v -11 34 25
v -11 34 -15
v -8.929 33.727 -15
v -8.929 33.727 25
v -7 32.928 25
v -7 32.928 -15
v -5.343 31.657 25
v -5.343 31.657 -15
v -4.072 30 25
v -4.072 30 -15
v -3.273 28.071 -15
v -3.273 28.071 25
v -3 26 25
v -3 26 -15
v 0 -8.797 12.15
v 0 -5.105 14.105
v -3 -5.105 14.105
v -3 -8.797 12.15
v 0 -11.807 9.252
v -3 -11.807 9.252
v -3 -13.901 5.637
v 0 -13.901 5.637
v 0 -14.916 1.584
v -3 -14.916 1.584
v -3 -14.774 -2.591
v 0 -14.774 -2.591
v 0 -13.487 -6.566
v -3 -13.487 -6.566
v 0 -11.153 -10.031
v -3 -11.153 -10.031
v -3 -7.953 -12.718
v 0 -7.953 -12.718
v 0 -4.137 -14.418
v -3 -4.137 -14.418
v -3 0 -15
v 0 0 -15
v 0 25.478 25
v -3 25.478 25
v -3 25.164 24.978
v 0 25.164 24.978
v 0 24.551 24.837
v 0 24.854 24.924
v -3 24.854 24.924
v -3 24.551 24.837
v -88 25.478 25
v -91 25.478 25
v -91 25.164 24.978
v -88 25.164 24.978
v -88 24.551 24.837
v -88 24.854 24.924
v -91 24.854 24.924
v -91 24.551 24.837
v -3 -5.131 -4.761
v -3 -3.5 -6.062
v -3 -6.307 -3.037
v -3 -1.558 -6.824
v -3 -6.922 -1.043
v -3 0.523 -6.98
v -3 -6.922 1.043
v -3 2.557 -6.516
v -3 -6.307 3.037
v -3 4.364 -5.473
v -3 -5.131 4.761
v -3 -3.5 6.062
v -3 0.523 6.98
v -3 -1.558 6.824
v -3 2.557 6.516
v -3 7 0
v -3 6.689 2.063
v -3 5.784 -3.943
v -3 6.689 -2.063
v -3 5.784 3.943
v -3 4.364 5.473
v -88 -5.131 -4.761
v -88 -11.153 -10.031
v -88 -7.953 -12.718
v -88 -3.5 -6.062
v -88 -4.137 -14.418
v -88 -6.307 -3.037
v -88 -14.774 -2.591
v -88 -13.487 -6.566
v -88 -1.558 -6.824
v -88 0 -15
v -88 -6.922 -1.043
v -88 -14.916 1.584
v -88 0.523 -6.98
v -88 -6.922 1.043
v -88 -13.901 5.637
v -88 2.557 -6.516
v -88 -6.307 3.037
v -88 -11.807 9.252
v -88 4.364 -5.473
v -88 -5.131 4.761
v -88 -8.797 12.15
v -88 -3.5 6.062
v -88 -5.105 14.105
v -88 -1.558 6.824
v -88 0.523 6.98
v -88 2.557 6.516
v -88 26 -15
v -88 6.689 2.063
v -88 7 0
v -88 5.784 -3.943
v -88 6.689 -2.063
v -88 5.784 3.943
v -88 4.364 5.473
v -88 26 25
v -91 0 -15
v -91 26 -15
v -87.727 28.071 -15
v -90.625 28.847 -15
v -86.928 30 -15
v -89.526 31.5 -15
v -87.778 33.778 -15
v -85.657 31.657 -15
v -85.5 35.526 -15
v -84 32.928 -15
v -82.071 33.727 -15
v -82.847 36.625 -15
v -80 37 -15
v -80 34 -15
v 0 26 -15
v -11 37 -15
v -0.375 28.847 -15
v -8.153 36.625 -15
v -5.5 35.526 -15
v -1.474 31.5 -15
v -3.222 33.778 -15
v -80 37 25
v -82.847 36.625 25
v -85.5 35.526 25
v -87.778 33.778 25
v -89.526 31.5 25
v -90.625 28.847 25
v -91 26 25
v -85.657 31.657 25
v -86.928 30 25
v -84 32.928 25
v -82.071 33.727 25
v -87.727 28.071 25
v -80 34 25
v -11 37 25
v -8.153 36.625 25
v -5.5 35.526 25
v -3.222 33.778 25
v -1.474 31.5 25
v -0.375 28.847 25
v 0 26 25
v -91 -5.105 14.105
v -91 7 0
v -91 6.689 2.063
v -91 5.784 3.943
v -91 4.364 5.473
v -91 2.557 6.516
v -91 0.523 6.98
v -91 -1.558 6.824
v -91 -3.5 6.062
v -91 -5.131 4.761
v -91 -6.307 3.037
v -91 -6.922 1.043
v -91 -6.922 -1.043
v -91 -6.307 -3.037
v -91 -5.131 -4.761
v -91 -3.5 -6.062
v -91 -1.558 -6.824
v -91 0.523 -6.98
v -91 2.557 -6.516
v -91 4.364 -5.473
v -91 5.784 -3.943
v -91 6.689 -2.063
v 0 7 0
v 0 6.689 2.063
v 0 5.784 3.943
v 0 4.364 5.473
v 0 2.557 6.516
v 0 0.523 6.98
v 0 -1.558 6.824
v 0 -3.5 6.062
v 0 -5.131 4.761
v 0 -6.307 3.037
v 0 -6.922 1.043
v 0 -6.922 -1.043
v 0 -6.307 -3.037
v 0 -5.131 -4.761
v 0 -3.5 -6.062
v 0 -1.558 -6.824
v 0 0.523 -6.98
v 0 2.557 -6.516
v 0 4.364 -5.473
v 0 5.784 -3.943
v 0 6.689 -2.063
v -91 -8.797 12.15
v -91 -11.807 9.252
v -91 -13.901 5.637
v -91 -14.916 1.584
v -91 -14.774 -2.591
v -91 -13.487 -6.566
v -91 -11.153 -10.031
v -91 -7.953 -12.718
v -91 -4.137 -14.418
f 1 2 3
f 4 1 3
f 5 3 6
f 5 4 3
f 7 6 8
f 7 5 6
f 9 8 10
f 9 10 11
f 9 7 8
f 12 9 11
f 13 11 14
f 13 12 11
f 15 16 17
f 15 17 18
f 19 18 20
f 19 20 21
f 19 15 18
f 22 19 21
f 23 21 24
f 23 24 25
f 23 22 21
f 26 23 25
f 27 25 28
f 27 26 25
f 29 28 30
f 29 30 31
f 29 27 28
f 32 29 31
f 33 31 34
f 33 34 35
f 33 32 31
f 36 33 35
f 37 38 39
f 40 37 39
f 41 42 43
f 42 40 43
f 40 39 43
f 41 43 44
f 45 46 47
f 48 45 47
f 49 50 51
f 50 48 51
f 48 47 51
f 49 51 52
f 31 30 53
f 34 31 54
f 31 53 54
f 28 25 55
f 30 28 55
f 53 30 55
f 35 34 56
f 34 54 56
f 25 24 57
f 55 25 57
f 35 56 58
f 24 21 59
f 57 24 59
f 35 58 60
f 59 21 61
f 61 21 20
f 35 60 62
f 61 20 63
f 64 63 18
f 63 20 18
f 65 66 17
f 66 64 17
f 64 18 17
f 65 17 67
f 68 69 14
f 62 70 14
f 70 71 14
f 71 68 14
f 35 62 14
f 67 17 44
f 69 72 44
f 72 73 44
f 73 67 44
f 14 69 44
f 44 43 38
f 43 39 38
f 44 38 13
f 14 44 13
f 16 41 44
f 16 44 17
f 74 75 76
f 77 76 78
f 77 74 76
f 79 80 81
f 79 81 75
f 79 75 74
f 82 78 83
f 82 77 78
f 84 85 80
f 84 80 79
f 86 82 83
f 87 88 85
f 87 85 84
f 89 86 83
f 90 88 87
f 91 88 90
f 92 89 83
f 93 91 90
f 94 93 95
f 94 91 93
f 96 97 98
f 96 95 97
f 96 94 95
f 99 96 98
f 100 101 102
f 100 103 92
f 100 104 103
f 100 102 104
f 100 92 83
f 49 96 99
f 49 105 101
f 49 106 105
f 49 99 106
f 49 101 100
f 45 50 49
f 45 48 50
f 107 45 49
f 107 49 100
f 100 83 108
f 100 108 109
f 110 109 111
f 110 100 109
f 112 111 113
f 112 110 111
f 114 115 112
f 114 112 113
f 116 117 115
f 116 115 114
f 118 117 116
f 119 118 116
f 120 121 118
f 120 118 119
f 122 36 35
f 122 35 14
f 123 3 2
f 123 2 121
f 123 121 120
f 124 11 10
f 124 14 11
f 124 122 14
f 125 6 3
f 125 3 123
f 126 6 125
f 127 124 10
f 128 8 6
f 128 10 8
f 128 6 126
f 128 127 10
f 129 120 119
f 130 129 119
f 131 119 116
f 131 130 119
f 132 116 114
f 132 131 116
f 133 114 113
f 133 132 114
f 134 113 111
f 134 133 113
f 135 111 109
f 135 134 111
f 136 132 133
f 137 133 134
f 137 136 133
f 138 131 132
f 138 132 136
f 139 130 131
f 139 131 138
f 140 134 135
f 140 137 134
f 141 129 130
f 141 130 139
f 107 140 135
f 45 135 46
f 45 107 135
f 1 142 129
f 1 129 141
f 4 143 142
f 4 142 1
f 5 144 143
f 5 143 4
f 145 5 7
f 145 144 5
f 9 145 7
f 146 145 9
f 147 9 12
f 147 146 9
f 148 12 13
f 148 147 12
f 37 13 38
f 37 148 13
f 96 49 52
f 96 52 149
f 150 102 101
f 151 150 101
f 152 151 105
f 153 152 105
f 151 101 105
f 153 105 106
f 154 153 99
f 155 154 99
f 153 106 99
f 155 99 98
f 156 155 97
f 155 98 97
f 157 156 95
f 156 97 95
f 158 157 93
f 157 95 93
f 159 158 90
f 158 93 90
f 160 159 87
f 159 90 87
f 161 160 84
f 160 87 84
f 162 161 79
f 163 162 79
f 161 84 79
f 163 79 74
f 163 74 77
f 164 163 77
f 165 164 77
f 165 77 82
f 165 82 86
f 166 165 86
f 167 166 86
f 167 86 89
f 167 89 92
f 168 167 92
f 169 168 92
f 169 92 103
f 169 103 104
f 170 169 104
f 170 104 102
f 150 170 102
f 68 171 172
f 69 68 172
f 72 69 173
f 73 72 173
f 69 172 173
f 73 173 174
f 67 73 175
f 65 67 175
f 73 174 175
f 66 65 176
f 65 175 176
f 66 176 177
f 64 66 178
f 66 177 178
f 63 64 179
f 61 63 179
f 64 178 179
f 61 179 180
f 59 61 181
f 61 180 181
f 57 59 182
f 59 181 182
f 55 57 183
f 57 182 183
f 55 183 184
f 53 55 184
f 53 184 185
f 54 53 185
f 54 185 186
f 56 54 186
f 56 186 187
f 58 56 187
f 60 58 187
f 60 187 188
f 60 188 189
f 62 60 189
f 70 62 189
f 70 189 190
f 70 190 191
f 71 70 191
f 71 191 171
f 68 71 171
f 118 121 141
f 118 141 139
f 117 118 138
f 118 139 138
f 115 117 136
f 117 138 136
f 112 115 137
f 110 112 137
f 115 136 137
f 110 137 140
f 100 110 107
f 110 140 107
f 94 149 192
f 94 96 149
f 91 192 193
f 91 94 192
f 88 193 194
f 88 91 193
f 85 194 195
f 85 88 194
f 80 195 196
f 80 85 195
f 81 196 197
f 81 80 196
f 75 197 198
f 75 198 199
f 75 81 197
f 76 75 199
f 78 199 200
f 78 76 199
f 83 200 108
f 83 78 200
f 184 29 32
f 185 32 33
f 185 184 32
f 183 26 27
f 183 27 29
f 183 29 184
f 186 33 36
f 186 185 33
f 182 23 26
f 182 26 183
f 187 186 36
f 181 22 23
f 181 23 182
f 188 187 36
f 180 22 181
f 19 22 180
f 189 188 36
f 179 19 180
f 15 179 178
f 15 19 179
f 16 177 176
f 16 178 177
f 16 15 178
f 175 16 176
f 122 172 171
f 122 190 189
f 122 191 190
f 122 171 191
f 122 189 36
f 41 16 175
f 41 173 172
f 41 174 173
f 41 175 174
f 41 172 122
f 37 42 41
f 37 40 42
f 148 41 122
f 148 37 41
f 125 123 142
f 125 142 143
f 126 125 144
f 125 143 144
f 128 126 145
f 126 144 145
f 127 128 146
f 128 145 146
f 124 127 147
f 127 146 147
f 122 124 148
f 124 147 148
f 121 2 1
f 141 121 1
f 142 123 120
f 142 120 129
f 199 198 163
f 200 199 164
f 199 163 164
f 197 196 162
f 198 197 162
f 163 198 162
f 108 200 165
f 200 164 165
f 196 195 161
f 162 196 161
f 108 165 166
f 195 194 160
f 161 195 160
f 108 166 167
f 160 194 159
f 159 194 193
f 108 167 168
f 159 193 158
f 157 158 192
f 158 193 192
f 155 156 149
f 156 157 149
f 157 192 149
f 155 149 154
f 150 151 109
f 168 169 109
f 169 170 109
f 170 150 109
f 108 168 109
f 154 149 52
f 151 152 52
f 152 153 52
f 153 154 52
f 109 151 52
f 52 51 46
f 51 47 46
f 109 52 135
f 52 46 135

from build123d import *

# Parameters (mm, degrees)
F0_R        = 7
F1_DEPTH    = 91
F2_R        = 11
F3_T        = -3
F4_DEPTH    = 100
F5_T1_DEPTH = 5.6326126102
F5_T3_DEPTH = 5.6326126102


# Not quite as in the source:
# - a fillet or chamfer that OpenCascade refuses, or shapes differently, is made with other operations: its cross-section is extruded or revolved along the edge and cut away or added


with BuildPart() as f1:
    # F0 (on Right) → F1 (new body)
    with BuildSketch(Plane.YZ):
        with BuildLine():
            ThreePointArc((-5.1046863561, 14.1046863561), (8.6148042537, 12.2794603982), (15, 0))
            ThreePointArc((15, 0), (10.6066017178, -10.6066017178), (0, -15))
            Line((0, -15), (37, -15))
            Line((37, -15), (37, 25))
            Line((37, 25), (25, 25))
            Line((25, 25), (-5.1046863561, 14.1046863561))
        make_face()
        with BuildLine():
            ThreePointArc((0, -15), (10.6066017178, -10.6066017178), (15, 0))
            ThreePointArc((15, 0), (8.6148042537, 12.2794603982), (-5.1046863561, 14.1046863561))
            ThreePointArc((-5.1046863561, 14.1046863561), (-14.7744762232, -2.5913032105), (0, -15))
        make_face()
        Circle(F0_R, mode=Mode.SUBTRACT)
        Circle(F0_R)
    extrude(amount=-F1_DEPTH)

    # F2
    f2_edges = [f1.edges().sort_by_distance(p)[0] for p in [
        (0, 37, 5),
        (-91, 37, 5),
    ]]
    fillet(f2_edges, radius=F2_R)

    # F3
    f3_openings = [f1.faces().sort_by_distance(p)[0] for p in [
        (-45.5, -14.774476, -2.591303),
        (-45.5, 18.248672, -15),
        (-45.5, 9.947657, 19.552343),
        (-45.5, 30.82309, 25),
    ]]
    offset(amount=F3_T, openings=f3_openings)

    # F0 (on Right) → F4 (cut)
    with BuildSketch(Plane.YZ):
        Circle(F0_R)
    extrude(amount=-F4_DEPTH, mode=Mode.SUBTRACT)

    # F5: fillet of radius 3 on 4 edges, made by hand

    # F5_s2 → F5_t1 (cut)
    with BuildSketch(Plane.YZ.offset(-4.3163063051)):
        with BuildLine():
            ThreePointArc((25.5265223701, 25.0004), (25.0078471195, 24.9552591608), (24.504768349, 24.821194021))
            Line((24.504768349, 24.821194021), (24.4025929469, 25.1035134232))
            ThreePointArc((24.4025929469, 25.1035134232), (24.6502768349, 25.1927283501), (24.8978245979, 25.2823194021))
            Line((24.8978245979, 25.2823194021), (25, 25.30024))
            ThreePointArc((25, 25.30024), (25.263261185, 25.30024), (25.5265223701, 25.30064))
            Line((25.5265223701, 25.30064), (25.5265223701, 25.0004))
        make_face()
    extrude(amount=F5_T1_DEPTH, mode=Mode.SUBTRACT)

    # F5_s4 → F5_t3 (cut)
    with BuildSketch(Plane.YZ.offset(-92.3163063051)):
        with BuildLine():
            ThreePointArc((25.5265223701, 25.0004), (25.0078471195, 24.9552591608), (24.504768349, 24.821194021))
            Line((24.504768349, 24.821194021), (24.4025929469, 25.1035134232))
            ThreePointArc((24.4025929469, 25.1035134232), (24.6502768349, 25.1927283501), (24.8978245979, 25.2823194021))
            Line((24.8978245979, 25.2823194021), (25, 25.30024))
            ThreePointArc((25, 25.30024), (25.263261185, 25.30024), (25.5265223701, 25.30064))
            Line((25.5265223701, 25.30064), (25.5265223701, 25.0004))
        make_face()
    extrude(amount=F5_T3_DEPTH, mode=Mode.SUBTRACT)


solid = f1.part
